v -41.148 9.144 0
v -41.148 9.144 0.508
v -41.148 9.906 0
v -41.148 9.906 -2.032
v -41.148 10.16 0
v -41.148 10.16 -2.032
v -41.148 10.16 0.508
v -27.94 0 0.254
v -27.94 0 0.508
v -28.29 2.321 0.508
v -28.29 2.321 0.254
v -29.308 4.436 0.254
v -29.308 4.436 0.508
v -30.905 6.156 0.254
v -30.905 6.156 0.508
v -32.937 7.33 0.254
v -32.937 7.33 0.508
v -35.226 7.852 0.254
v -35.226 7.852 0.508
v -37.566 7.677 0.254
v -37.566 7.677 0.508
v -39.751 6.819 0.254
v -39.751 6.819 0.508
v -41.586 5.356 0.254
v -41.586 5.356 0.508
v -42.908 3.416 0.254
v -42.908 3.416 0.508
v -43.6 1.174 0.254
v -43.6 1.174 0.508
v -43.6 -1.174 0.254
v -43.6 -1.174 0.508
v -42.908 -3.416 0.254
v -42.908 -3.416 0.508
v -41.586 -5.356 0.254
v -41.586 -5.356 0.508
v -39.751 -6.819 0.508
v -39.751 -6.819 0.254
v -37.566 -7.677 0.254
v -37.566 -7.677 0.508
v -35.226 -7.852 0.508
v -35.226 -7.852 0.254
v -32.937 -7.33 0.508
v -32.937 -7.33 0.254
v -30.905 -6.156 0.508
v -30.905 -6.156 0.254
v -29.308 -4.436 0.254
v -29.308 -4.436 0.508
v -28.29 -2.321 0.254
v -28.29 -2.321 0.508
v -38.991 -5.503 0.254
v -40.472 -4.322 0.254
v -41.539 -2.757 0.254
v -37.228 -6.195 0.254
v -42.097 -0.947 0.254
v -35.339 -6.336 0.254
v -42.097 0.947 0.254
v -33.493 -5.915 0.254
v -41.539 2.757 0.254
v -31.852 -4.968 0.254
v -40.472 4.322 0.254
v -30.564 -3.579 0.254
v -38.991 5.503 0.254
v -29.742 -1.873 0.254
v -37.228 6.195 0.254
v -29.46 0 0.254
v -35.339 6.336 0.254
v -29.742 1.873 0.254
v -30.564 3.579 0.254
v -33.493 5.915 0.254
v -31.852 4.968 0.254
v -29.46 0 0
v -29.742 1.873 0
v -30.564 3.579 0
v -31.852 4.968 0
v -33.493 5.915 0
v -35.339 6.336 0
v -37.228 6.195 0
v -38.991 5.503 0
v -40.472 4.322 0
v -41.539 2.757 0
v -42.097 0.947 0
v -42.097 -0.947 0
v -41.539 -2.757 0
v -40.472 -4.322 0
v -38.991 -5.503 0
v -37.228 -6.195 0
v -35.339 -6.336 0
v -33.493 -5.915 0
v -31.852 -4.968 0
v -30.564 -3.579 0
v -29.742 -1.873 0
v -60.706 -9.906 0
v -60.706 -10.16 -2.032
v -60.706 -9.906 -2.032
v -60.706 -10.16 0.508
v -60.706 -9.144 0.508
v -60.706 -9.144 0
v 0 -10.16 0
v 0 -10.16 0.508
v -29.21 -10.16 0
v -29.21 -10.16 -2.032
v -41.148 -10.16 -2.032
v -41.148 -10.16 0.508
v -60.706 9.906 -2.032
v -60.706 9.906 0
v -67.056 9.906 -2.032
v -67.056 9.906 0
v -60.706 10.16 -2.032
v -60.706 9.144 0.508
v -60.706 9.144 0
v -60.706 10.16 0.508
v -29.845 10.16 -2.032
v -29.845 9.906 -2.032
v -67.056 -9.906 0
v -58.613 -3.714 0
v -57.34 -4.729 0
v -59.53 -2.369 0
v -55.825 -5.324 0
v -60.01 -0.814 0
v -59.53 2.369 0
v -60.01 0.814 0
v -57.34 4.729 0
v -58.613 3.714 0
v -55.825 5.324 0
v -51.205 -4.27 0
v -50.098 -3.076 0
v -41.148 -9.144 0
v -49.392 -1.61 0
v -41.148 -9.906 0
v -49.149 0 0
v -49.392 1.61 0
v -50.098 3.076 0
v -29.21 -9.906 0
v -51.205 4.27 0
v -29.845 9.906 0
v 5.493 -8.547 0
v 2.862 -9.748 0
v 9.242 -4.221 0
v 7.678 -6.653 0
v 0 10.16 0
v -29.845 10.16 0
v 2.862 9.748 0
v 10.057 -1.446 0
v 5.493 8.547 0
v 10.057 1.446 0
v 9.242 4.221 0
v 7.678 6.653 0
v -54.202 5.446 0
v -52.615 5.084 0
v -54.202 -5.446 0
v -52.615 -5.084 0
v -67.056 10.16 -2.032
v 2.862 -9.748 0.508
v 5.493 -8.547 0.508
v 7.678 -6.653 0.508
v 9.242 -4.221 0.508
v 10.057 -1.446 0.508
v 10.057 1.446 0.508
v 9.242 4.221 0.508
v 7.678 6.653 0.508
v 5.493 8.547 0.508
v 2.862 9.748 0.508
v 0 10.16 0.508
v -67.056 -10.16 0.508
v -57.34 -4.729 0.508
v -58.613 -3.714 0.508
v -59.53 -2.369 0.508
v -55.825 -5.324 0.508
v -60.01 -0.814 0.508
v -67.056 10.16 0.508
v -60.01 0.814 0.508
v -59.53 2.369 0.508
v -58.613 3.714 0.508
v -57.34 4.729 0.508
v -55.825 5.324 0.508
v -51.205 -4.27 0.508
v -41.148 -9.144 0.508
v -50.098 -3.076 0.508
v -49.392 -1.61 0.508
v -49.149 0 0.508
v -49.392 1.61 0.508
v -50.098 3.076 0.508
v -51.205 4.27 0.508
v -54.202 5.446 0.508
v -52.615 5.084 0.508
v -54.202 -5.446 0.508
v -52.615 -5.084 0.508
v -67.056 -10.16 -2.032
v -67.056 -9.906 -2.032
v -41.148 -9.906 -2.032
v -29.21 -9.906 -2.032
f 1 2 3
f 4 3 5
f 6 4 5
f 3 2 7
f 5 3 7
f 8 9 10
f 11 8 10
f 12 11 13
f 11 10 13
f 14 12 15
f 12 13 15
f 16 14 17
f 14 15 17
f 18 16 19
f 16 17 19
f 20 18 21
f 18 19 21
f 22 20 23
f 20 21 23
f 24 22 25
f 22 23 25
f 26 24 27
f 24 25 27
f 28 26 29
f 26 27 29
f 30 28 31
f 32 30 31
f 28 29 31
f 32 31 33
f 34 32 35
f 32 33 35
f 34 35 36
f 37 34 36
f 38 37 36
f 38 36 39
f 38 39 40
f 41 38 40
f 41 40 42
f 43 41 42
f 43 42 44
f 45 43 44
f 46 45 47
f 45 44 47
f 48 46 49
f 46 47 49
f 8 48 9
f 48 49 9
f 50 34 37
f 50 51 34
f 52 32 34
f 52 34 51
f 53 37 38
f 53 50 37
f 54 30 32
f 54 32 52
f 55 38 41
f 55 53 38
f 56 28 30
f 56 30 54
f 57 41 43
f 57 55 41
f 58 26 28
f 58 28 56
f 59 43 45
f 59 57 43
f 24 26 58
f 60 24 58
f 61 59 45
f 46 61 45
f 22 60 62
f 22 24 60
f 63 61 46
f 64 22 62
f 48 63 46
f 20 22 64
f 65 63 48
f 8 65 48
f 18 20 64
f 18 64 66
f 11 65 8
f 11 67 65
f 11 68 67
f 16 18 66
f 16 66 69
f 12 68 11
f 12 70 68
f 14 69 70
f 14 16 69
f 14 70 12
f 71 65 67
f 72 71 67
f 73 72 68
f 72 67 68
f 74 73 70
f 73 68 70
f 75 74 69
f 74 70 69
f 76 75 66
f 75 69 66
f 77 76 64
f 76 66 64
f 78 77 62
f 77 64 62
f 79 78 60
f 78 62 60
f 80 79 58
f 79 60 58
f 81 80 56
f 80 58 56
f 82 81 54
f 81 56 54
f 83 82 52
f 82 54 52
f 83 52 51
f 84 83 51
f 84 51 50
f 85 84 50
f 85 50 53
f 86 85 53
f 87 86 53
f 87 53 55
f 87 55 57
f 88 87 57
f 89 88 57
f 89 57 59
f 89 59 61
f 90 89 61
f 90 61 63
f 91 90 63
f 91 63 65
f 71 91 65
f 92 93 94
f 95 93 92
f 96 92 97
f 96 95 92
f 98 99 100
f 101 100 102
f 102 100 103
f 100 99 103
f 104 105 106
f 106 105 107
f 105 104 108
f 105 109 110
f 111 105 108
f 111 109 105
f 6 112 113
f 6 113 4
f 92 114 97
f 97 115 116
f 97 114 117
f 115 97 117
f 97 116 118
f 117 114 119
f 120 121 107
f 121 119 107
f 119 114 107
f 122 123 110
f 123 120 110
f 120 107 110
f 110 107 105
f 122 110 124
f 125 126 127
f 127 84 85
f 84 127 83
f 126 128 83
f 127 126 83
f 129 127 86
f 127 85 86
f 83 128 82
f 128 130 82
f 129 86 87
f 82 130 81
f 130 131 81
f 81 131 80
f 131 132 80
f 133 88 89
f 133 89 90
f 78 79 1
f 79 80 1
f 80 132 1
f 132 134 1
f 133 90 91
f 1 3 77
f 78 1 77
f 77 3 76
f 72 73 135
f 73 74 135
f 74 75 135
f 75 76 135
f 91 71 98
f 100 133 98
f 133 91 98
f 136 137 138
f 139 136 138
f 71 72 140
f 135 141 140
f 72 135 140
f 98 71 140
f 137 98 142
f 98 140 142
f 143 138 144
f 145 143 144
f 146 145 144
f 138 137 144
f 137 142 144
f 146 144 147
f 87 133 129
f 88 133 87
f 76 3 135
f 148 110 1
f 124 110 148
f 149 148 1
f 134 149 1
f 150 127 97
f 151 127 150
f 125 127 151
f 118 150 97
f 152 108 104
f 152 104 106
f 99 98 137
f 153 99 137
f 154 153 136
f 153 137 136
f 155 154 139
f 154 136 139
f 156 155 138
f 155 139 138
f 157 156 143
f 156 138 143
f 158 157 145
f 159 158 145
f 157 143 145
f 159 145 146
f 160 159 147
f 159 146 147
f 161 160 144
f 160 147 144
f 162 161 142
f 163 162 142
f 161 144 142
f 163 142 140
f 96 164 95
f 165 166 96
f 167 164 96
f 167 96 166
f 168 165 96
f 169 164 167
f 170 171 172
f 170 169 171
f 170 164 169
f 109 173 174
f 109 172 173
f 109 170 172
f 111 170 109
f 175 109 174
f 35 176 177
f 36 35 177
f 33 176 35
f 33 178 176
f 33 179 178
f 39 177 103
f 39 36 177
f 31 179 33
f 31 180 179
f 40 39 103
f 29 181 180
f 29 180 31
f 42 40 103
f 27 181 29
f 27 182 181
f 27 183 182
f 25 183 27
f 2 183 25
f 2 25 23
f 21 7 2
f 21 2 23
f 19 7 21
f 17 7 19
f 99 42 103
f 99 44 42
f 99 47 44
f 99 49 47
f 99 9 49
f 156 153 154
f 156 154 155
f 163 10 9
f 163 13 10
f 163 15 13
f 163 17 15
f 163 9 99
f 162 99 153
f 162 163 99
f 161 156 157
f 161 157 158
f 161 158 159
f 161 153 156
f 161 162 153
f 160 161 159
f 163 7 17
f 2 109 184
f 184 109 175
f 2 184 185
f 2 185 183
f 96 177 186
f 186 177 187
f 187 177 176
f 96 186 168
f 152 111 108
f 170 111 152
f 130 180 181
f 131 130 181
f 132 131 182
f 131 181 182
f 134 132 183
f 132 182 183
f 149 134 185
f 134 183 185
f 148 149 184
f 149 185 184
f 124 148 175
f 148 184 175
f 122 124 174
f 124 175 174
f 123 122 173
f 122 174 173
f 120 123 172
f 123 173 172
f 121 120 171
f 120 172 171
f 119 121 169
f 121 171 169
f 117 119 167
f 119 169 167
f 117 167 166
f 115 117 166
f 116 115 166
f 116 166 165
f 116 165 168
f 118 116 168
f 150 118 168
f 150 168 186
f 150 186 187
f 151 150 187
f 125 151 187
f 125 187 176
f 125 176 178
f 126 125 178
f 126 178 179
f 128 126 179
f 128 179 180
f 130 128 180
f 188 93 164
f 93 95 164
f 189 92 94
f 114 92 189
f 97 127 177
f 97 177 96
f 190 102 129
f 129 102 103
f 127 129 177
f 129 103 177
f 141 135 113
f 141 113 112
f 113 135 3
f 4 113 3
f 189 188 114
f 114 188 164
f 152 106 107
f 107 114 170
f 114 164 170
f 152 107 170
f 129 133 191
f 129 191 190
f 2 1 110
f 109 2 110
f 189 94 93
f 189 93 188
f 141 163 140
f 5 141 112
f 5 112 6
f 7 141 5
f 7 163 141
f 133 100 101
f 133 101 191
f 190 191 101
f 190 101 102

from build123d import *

# Parameters (mm, degrees)
BOSS_EXTRUDE1_DEPTH = 0.508
SKETCH2_R           = 7.874
SKETCH2_R_2         = 6.35
CUT_EXTRUDE2_DEPTH  = 0.254
SKETCH5_R           = 6.354160617
CUT_EXTRUDE3_DEPTH  = 68.821805137
SKETCH6_R           = 5.461
CUT_EXTRUDE4_DEPTH  = 68.821805137
SKETCH7_W           = 19.558
SKETCH7_H           = 1.016
CUT_EXTRUDE5_DEPTH  = 68.823232008
SKETCH8_W           = 6.35
SKETCH8_H           = 0.254
BOSS_EXTRUDE2_DEPTH = 2.032
SKETCH10_W          = 11.303182767
SKETCH10_H          = 0.254
BOSS_EXTRUDE3_DEPTH = 2.032
SKETCH11_W          = 6.35
SKETCH11_H          = 0.254
BOSS_EXTRUDE4_DEPTH = 2.032
SKETCH12_W          = 11.938
SKETCH12_H          = 0.254
BOSS_EXTRUDE5_DEPTH = 2.032
SKETCH13_R          = 7.874
CUT_EXTRUDE7_DEPTH  = 0.254
SKETCH14_R          = 7.874
SKETCH14_R_2        = 5.461
BOSS_EXTRUDE8_DEPTH = 0.254


with BuildPart() as part:
    # Sketch1 → Boss-Extrude1 (new body)
    with BuildSketch(Plane.XY):
        with BuildLine():
            ThreePointArc((0, -10.16), (10.16, 0), (0, 10.16))
            Line((0, 10.16), (-67.056, 10.16))
            Line((-67.056, 10.16), (-67.056, -10.16))
            Line((-67.056, -10.16), (0, -10.16))
        make_face()
    extrude(amount=BOSS_EXTRUDE1_DEPTH)

    # Sketch2 → Cut-Extrude2 (cut)
    with BuildSketch(Plane.XY.offset(0.508)):
        with Locations((-54.61, 0)):
            Circle(SKETCH2_R)
        with Locations((-35.814, 0)):
            Circle(SKETCH2_R_2)
    extrude(amount=-CUT_EXTRUDE2_DEPTH, mode=Mode.SUBTRACT)

    # Sketch5 → Cut-Extrude3 (cut, through all)
    with BuildSketch(Plane.XY.offset(0.254)):
        with Locations((-35.814, 0)):
            Circle(SKETCH5_R)
    extrude(amount=-CUT_EXTRUDE3_DEPTH, mode=Mode.SUBTRACT)

    # Sketch6 → Cut-Extrude4 (cut, through all)
    with BuildSketch(Plane.XY.offset(0.254)):
        with Locations((-54.61, 0)):
            Circle(SKETCH6_R)
    extrude(amount=-CUT_EXTRUDE4_DEPTH, mode=Mode.SUBTRACT)

    # Sketch7 → Cut-Extrude5 (cut, through all)
    with BuildSketch(Plane(origin=(0, 0, 0), x_dir=(-1, 0, 0), z_dir=(0, 0, -1))):
        with Locations((50.927, 9.652)):
            Rectangle(SKETCH7_W, SKETCH7_H)
        with Locations((50.927, -9.652)):
            Rectangle(SKETCH7_W, SKETCH7_H)
    extrude(amount=-CUT_EXTRUDE5_DEPTH, mode=Mode.SUBTRACT)

    # Sketch8 → Boss-Extrude2 (add)
    with BuildSketch(Plane(origin=(0, 0, 0), x_dir=(-1, 0, 0), z_dir=(0, 0, -1))):
        with Locations((63.881, 10.033)):
            Rectangle(SKETCH8_W, SKETCH8_H)
    extrude(amount=BOSS_EXTRUDE2_DEPTH)

    # Sketch10 → Boss-Extrude3 (add)
    with BuildSketch(Plane(origin=(0, 0, 0), x_dir=(-1, 0, 0), z_dir=(0, 0, -1))):
        with Locations((35.496408617, 10.033)):
            Rectangle(SKETCH10_W, SKETCH10_H)
    extrude(amount=BOSS_EXTRUDE3_DEPTH)

    # Sketch11 → Boss-Extrude4 (add)
    with BuildSketch(Plane(origin=(0, 0, 0), x_dir=(-1, 0, 0), z_dir=(0, 0, -1))):
        with Locations((63.881, -10.033)):
            Rectangle(SKETCH11_W, SKETCH11_H)
    extrude(amount=BOSS_EXTRUDE4_DEPTH)

    # Sketch12 → Boss-Extrude5 (add)
    with BuildSketch(Plane(origin=(0, 0, 0), x_dir=(-1, 0, 0), z_dir=(0, 0, -1))):
        with Locations((35.179, -10.033)):
            Rectangle(SKETCH12_W, SKETCH12_H)
    extrude(amount=BOSS_EXTRUDE5_DEPTH)

    # Sketch13 → Cut-Extrude7 (cut)
    with BuildSketch(Plane.XY.offset(0.508)):
        with Locations((-35.814, 0)):
            Circle(SKETCH13_R)
    extrude(amount=-CUT_EXTRUDE7_DEPTH, mode=Mode.SUBTRACT)

    # Sketch14 → Boss-Extrude8 (add)
    with BuildSketch(Plane.XY.offset(0.508)):
        with Locations((-54.61, 0)):
            Circle(SKETCH14_R)
        with Locations((-54.61, 0)):
            Circle(SKETCH14_R_2, mode=Mode.SUBTRACT)
    extrude(amount=-BOSS_EXTRUDE8_DEPTH)


solid = part.part
